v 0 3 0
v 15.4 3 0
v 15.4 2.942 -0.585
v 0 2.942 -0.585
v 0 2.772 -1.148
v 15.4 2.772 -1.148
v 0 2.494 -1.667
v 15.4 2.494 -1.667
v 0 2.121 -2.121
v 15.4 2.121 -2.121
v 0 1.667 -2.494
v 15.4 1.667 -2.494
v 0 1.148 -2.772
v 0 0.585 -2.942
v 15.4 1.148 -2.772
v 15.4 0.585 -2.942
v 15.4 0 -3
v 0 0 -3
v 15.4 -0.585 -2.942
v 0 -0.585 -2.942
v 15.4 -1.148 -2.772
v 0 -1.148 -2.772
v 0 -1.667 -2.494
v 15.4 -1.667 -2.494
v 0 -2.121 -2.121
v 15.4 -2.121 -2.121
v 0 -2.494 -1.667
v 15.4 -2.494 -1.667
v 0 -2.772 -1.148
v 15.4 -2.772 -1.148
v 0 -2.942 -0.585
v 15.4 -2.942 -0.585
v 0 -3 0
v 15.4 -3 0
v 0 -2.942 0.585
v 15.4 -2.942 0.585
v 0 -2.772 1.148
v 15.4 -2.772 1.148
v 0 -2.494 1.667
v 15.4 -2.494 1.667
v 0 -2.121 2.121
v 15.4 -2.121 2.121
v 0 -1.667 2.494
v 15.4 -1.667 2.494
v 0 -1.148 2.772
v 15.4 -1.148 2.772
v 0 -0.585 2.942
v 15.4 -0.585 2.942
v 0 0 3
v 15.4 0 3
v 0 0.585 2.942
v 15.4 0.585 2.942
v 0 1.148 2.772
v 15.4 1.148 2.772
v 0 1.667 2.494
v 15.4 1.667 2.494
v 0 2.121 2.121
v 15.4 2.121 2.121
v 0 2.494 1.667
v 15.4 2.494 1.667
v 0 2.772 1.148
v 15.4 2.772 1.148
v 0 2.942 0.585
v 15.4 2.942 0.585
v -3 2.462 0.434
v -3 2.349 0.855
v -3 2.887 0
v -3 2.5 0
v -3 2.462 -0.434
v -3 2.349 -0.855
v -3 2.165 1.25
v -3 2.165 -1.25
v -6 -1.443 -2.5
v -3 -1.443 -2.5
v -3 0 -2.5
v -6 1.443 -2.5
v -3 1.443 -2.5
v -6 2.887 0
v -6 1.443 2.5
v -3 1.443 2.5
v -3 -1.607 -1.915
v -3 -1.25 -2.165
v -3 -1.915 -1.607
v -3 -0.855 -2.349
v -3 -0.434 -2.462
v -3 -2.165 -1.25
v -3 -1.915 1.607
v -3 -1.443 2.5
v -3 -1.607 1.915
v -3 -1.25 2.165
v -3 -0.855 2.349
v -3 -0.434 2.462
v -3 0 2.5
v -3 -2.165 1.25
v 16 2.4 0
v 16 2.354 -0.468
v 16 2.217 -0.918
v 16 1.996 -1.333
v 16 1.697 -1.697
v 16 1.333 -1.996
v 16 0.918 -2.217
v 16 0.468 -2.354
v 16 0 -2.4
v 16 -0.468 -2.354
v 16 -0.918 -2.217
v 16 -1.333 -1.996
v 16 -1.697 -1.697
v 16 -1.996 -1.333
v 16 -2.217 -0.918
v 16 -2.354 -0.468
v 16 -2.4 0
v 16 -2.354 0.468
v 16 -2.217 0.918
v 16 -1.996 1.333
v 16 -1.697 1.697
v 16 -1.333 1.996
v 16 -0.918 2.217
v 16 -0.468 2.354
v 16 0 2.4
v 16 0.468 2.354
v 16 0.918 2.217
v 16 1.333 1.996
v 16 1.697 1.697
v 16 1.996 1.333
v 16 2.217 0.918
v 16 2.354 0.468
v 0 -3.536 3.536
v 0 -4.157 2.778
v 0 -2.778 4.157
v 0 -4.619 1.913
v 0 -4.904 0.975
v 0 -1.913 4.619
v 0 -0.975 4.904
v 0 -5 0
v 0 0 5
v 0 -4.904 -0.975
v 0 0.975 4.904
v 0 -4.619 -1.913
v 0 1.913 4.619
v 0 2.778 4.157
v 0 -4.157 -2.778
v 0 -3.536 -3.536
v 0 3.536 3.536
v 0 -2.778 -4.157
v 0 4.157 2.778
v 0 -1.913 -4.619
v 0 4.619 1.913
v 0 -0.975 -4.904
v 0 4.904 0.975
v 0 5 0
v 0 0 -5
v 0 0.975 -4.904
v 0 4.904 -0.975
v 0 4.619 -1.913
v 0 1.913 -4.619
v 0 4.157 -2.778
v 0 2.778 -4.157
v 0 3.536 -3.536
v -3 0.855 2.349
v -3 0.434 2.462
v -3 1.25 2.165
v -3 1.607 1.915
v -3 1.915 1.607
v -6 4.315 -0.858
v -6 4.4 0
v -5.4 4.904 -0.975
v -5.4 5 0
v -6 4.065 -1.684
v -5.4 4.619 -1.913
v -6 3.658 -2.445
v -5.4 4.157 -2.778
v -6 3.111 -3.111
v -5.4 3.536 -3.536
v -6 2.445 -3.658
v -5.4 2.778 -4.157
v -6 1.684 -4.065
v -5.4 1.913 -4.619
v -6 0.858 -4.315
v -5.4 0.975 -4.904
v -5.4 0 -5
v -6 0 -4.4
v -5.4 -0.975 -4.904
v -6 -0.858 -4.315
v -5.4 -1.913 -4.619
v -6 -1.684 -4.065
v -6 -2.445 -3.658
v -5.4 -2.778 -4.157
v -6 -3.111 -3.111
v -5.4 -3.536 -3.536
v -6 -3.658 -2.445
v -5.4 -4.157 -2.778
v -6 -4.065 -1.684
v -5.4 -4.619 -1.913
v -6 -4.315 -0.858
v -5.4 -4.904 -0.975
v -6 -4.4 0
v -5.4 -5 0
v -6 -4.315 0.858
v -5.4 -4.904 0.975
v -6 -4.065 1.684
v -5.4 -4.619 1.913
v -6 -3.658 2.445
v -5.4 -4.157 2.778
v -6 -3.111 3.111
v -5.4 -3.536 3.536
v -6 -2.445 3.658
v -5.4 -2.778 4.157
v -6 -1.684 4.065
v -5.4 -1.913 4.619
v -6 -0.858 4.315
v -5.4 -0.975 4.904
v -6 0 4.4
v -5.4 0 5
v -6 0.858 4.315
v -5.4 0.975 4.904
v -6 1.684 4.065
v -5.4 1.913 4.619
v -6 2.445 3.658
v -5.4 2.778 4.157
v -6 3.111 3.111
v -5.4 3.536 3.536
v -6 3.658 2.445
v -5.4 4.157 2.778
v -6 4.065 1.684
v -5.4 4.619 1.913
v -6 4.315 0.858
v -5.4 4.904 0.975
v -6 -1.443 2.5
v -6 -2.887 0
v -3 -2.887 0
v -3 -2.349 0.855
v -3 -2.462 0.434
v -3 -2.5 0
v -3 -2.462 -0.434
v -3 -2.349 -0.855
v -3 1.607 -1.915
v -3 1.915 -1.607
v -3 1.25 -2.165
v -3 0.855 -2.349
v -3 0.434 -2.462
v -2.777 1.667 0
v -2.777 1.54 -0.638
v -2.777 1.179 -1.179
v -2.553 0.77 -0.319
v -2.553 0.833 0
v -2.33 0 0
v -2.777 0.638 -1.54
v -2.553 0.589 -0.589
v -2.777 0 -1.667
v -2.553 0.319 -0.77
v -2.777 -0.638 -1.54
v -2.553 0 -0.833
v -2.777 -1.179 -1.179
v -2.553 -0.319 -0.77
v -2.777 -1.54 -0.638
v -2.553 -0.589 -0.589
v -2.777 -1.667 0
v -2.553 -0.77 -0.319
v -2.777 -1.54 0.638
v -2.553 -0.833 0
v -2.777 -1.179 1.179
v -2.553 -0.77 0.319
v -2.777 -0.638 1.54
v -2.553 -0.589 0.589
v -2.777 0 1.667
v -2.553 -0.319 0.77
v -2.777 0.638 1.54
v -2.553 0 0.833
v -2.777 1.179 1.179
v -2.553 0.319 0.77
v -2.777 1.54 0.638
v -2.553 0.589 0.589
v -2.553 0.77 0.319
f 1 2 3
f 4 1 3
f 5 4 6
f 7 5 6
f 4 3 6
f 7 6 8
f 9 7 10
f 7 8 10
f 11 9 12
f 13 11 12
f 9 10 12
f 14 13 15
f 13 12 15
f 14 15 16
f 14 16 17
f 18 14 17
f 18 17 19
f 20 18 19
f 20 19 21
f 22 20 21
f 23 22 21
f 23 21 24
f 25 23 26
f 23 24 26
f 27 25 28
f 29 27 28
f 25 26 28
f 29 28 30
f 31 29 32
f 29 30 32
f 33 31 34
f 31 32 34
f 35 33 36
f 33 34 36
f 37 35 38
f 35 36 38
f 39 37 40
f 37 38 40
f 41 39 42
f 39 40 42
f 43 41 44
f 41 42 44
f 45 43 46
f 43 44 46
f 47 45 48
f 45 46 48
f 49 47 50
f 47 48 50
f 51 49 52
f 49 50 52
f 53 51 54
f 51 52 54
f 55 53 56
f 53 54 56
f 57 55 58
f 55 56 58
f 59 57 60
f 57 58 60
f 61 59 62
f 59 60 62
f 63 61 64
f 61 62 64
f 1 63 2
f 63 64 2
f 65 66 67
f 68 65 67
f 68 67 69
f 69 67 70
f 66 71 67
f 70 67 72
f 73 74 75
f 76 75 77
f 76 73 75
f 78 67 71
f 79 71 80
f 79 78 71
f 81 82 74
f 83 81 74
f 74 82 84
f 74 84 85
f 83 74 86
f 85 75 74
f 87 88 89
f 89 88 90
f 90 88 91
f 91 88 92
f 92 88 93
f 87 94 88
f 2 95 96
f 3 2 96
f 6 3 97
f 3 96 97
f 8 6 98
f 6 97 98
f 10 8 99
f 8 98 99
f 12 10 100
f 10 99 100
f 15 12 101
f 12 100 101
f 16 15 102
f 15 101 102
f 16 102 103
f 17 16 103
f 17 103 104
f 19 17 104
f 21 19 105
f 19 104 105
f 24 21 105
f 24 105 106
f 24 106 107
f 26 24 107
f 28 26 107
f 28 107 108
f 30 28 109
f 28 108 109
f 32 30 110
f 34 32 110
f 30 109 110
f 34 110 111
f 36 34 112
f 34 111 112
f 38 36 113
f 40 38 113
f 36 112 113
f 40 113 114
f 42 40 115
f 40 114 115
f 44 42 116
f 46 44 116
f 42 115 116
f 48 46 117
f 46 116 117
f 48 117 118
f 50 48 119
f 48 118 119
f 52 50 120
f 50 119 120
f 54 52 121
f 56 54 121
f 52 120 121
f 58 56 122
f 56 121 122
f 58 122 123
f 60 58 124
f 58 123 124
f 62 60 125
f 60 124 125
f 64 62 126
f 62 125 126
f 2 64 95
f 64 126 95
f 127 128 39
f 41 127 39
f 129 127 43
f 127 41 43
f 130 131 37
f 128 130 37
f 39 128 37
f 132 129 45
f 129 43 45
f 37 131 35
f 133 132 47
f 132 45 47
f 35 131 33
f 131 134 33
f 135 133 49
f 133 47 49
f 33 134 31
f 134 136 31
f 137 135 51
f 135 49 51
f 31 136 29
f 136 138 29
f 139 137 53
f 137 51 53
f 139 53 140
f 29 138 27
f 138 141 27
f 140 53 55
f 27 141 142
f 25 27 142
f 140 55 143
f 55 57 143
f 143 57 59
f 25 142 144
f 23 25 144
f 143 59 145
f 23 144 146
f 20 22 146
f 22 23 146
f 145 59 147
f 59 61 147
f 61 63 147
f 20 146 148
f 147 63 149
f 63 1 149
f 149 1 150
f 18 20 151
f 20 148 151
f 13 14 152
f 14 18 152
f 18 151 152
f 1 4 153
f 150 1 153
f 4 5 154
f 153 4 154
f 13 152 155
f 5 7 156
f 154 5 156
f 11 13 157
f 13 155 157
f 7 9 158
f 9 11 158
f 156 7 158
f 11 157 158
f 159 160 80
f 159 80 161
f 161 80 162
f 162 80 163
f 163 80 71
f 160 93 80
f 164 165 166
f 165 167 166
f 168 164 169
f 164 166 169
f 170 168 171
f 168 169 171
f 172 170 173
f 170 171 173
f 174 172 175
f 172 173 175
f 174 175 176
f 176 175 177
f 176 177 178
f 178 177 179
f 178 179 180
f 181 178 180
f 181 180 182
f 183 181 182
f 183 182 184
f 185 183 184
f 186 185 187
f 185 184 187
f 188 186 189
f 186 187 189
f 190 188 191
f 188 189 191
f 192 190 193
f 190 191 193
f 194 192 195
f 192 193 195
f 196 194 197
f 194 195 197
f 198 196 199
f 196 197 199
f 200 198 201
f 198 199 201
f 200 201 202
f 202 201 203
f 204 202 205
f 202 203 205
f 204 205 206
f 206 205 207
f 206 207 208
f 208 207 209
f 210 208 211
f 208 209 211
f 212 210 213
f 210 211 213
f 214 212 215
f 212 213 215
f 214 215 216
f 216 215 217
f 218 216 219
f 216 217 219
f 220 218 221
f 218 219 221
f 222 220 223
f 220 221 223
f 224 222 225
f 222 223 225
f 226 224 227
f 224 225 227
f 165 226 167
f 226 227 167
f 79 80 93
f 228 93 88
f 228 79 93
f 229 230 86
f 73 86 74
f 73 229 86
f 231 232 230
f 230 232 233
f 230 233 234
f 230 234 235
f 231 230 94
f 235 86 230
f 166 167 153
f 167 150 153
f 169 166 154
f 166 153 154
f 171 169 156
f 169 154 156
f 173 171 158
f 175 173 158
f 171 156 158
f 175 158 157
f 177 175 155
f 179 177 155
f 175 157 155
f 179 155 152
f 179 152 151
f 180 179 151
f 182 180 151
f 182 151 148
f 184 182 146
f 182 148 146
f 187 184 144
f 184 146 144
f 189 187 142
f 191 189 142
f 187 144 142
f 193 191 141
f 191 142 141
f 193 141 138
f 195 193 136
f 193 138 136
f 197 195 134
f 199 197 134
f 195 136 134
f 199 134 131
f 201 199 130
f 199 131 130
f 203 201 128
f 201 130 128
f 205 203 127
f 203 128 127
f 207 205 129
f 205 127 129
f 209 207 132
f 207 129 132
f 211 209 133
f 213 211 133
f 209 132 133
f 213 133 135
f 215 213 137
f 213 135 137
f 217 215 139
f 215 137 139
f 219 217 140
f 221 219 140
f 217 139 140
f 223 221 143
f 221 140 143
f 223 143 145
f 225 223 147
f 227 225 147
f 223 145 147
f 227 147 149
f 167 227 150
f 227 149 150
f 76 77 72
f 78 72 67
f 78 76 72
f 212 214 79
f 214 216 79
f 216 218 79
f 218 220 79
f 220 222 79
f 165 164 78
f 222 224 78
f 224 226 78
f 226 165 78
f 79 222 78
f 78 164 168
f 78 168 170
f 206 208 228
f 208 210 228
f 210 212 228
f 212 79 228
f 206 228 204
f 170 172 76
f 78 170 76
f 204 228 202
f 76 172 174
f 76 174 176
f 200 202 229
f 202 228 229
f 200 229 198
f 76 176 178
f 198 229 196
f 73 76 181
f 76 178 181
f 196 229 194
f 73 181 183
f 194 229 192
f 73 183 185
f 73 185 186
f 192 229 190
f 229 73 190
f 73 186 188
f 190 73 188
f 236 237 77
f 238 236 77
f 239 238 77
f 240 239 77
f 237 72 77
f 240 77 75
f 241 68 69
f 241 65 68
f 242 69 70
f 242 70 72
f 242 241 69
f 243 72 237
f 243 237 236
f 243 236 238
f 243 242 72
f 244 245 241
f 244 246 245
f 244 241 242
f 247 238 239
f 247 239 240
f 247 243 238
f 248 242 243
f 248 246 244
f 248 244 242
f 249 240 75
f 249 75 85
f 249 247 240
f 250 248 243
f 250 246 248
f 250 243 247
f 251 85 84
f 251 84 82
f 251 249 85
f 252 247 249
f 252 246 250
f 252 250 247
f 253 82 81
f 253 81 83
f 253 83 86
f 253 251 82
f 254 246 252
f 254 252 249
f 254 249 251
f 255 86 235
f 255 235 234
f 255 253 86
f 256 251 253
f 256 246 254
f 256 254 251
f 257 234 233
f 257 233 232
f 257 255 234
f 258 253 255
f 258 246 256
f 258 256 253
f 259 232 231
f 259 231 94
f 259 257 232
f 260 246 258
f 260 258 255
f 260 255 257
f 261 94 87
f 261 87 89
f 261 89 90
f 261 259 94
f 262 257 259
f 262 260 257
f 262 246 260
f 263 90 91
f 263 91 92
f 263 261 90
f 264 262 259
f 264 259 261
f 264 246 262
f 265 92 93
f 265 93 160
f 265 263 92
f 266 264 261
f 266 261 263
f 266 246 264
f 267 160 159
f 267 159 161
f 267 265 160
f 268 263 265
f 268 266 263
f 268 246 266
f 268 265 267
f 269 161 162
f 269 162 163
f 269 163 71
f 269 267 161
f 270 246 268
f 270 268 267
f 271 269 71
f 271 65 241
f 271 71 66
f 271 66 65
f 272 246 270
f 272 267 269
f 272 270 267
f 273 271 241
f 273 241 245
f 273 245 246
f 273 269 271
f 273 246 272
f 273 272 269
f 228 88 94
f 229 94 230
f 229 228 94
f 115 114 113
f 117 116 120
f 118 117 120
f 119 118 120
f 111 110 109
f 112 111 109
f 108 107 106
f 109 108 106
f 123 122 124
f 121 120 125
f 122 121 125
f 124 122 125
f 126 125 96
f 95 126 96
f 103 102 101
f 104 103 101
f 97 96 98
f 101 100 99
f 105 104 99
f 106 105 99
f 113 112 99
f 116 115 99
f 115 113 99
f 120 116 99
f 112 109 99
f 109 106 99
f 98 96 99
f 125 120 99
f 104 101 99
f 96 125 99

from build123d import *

# Parameters (mm, degrees)
CHAMFER1_SIZE      = 0.6
CUT_EXTRUDE1_DEPTH = 3


with BuildPart() as part:
    # Sketch1 → Revolve1 (revolve)
    with BuildSketch(Plane.XY):
        Polygon((-6, 0), (-6, 4.4), (-5.4, 5), (0, 5), (0, 3), (16, 3), (16, 0), align=None)
    revolve(axis=Axis((16, 0, 0), (-1, 0, 0)))

    # Chamfer1
    chamfer1_edges = [part.edges().sort_by_distance(p)[0] for p in [
        (16, -3, 0),
    ]]
    chamfer(chamfer1_edges, length=CHAMFER1_SIZE)

    # Sketch2 → Cut-Revolve1 (revolve, cut)
    with BuildSketch(Plane.XY):
        Polygon((-6, 0), (-6, 2.5), (-3, 2.5), (-2.330127019, 0), align=None)
    revolve(axis=Axis((-2.330127019, 0, 0), (-1, 0, 0)), mode=Mode.SUBTRACT)

    # Sketch3 → Cut-Extrude1 (cut)
    with BuildSketch(Plane(origin=(-6, 0, 0), x_dir=(0, 0, -1), z_dir=(1, 0, 0))):
        Polygon((-2.5, 1.443375673), (-2.5, -1.443375673), (0, -2.886751346), (2.5, -1.443375673), (2.5, 1.443375673), (0, 2.886751346), align=None)
    extrude(amount=CUT_EXTRUDE1_DEPTH, mode=Mode.SUBTRACT)


solid = part.part
